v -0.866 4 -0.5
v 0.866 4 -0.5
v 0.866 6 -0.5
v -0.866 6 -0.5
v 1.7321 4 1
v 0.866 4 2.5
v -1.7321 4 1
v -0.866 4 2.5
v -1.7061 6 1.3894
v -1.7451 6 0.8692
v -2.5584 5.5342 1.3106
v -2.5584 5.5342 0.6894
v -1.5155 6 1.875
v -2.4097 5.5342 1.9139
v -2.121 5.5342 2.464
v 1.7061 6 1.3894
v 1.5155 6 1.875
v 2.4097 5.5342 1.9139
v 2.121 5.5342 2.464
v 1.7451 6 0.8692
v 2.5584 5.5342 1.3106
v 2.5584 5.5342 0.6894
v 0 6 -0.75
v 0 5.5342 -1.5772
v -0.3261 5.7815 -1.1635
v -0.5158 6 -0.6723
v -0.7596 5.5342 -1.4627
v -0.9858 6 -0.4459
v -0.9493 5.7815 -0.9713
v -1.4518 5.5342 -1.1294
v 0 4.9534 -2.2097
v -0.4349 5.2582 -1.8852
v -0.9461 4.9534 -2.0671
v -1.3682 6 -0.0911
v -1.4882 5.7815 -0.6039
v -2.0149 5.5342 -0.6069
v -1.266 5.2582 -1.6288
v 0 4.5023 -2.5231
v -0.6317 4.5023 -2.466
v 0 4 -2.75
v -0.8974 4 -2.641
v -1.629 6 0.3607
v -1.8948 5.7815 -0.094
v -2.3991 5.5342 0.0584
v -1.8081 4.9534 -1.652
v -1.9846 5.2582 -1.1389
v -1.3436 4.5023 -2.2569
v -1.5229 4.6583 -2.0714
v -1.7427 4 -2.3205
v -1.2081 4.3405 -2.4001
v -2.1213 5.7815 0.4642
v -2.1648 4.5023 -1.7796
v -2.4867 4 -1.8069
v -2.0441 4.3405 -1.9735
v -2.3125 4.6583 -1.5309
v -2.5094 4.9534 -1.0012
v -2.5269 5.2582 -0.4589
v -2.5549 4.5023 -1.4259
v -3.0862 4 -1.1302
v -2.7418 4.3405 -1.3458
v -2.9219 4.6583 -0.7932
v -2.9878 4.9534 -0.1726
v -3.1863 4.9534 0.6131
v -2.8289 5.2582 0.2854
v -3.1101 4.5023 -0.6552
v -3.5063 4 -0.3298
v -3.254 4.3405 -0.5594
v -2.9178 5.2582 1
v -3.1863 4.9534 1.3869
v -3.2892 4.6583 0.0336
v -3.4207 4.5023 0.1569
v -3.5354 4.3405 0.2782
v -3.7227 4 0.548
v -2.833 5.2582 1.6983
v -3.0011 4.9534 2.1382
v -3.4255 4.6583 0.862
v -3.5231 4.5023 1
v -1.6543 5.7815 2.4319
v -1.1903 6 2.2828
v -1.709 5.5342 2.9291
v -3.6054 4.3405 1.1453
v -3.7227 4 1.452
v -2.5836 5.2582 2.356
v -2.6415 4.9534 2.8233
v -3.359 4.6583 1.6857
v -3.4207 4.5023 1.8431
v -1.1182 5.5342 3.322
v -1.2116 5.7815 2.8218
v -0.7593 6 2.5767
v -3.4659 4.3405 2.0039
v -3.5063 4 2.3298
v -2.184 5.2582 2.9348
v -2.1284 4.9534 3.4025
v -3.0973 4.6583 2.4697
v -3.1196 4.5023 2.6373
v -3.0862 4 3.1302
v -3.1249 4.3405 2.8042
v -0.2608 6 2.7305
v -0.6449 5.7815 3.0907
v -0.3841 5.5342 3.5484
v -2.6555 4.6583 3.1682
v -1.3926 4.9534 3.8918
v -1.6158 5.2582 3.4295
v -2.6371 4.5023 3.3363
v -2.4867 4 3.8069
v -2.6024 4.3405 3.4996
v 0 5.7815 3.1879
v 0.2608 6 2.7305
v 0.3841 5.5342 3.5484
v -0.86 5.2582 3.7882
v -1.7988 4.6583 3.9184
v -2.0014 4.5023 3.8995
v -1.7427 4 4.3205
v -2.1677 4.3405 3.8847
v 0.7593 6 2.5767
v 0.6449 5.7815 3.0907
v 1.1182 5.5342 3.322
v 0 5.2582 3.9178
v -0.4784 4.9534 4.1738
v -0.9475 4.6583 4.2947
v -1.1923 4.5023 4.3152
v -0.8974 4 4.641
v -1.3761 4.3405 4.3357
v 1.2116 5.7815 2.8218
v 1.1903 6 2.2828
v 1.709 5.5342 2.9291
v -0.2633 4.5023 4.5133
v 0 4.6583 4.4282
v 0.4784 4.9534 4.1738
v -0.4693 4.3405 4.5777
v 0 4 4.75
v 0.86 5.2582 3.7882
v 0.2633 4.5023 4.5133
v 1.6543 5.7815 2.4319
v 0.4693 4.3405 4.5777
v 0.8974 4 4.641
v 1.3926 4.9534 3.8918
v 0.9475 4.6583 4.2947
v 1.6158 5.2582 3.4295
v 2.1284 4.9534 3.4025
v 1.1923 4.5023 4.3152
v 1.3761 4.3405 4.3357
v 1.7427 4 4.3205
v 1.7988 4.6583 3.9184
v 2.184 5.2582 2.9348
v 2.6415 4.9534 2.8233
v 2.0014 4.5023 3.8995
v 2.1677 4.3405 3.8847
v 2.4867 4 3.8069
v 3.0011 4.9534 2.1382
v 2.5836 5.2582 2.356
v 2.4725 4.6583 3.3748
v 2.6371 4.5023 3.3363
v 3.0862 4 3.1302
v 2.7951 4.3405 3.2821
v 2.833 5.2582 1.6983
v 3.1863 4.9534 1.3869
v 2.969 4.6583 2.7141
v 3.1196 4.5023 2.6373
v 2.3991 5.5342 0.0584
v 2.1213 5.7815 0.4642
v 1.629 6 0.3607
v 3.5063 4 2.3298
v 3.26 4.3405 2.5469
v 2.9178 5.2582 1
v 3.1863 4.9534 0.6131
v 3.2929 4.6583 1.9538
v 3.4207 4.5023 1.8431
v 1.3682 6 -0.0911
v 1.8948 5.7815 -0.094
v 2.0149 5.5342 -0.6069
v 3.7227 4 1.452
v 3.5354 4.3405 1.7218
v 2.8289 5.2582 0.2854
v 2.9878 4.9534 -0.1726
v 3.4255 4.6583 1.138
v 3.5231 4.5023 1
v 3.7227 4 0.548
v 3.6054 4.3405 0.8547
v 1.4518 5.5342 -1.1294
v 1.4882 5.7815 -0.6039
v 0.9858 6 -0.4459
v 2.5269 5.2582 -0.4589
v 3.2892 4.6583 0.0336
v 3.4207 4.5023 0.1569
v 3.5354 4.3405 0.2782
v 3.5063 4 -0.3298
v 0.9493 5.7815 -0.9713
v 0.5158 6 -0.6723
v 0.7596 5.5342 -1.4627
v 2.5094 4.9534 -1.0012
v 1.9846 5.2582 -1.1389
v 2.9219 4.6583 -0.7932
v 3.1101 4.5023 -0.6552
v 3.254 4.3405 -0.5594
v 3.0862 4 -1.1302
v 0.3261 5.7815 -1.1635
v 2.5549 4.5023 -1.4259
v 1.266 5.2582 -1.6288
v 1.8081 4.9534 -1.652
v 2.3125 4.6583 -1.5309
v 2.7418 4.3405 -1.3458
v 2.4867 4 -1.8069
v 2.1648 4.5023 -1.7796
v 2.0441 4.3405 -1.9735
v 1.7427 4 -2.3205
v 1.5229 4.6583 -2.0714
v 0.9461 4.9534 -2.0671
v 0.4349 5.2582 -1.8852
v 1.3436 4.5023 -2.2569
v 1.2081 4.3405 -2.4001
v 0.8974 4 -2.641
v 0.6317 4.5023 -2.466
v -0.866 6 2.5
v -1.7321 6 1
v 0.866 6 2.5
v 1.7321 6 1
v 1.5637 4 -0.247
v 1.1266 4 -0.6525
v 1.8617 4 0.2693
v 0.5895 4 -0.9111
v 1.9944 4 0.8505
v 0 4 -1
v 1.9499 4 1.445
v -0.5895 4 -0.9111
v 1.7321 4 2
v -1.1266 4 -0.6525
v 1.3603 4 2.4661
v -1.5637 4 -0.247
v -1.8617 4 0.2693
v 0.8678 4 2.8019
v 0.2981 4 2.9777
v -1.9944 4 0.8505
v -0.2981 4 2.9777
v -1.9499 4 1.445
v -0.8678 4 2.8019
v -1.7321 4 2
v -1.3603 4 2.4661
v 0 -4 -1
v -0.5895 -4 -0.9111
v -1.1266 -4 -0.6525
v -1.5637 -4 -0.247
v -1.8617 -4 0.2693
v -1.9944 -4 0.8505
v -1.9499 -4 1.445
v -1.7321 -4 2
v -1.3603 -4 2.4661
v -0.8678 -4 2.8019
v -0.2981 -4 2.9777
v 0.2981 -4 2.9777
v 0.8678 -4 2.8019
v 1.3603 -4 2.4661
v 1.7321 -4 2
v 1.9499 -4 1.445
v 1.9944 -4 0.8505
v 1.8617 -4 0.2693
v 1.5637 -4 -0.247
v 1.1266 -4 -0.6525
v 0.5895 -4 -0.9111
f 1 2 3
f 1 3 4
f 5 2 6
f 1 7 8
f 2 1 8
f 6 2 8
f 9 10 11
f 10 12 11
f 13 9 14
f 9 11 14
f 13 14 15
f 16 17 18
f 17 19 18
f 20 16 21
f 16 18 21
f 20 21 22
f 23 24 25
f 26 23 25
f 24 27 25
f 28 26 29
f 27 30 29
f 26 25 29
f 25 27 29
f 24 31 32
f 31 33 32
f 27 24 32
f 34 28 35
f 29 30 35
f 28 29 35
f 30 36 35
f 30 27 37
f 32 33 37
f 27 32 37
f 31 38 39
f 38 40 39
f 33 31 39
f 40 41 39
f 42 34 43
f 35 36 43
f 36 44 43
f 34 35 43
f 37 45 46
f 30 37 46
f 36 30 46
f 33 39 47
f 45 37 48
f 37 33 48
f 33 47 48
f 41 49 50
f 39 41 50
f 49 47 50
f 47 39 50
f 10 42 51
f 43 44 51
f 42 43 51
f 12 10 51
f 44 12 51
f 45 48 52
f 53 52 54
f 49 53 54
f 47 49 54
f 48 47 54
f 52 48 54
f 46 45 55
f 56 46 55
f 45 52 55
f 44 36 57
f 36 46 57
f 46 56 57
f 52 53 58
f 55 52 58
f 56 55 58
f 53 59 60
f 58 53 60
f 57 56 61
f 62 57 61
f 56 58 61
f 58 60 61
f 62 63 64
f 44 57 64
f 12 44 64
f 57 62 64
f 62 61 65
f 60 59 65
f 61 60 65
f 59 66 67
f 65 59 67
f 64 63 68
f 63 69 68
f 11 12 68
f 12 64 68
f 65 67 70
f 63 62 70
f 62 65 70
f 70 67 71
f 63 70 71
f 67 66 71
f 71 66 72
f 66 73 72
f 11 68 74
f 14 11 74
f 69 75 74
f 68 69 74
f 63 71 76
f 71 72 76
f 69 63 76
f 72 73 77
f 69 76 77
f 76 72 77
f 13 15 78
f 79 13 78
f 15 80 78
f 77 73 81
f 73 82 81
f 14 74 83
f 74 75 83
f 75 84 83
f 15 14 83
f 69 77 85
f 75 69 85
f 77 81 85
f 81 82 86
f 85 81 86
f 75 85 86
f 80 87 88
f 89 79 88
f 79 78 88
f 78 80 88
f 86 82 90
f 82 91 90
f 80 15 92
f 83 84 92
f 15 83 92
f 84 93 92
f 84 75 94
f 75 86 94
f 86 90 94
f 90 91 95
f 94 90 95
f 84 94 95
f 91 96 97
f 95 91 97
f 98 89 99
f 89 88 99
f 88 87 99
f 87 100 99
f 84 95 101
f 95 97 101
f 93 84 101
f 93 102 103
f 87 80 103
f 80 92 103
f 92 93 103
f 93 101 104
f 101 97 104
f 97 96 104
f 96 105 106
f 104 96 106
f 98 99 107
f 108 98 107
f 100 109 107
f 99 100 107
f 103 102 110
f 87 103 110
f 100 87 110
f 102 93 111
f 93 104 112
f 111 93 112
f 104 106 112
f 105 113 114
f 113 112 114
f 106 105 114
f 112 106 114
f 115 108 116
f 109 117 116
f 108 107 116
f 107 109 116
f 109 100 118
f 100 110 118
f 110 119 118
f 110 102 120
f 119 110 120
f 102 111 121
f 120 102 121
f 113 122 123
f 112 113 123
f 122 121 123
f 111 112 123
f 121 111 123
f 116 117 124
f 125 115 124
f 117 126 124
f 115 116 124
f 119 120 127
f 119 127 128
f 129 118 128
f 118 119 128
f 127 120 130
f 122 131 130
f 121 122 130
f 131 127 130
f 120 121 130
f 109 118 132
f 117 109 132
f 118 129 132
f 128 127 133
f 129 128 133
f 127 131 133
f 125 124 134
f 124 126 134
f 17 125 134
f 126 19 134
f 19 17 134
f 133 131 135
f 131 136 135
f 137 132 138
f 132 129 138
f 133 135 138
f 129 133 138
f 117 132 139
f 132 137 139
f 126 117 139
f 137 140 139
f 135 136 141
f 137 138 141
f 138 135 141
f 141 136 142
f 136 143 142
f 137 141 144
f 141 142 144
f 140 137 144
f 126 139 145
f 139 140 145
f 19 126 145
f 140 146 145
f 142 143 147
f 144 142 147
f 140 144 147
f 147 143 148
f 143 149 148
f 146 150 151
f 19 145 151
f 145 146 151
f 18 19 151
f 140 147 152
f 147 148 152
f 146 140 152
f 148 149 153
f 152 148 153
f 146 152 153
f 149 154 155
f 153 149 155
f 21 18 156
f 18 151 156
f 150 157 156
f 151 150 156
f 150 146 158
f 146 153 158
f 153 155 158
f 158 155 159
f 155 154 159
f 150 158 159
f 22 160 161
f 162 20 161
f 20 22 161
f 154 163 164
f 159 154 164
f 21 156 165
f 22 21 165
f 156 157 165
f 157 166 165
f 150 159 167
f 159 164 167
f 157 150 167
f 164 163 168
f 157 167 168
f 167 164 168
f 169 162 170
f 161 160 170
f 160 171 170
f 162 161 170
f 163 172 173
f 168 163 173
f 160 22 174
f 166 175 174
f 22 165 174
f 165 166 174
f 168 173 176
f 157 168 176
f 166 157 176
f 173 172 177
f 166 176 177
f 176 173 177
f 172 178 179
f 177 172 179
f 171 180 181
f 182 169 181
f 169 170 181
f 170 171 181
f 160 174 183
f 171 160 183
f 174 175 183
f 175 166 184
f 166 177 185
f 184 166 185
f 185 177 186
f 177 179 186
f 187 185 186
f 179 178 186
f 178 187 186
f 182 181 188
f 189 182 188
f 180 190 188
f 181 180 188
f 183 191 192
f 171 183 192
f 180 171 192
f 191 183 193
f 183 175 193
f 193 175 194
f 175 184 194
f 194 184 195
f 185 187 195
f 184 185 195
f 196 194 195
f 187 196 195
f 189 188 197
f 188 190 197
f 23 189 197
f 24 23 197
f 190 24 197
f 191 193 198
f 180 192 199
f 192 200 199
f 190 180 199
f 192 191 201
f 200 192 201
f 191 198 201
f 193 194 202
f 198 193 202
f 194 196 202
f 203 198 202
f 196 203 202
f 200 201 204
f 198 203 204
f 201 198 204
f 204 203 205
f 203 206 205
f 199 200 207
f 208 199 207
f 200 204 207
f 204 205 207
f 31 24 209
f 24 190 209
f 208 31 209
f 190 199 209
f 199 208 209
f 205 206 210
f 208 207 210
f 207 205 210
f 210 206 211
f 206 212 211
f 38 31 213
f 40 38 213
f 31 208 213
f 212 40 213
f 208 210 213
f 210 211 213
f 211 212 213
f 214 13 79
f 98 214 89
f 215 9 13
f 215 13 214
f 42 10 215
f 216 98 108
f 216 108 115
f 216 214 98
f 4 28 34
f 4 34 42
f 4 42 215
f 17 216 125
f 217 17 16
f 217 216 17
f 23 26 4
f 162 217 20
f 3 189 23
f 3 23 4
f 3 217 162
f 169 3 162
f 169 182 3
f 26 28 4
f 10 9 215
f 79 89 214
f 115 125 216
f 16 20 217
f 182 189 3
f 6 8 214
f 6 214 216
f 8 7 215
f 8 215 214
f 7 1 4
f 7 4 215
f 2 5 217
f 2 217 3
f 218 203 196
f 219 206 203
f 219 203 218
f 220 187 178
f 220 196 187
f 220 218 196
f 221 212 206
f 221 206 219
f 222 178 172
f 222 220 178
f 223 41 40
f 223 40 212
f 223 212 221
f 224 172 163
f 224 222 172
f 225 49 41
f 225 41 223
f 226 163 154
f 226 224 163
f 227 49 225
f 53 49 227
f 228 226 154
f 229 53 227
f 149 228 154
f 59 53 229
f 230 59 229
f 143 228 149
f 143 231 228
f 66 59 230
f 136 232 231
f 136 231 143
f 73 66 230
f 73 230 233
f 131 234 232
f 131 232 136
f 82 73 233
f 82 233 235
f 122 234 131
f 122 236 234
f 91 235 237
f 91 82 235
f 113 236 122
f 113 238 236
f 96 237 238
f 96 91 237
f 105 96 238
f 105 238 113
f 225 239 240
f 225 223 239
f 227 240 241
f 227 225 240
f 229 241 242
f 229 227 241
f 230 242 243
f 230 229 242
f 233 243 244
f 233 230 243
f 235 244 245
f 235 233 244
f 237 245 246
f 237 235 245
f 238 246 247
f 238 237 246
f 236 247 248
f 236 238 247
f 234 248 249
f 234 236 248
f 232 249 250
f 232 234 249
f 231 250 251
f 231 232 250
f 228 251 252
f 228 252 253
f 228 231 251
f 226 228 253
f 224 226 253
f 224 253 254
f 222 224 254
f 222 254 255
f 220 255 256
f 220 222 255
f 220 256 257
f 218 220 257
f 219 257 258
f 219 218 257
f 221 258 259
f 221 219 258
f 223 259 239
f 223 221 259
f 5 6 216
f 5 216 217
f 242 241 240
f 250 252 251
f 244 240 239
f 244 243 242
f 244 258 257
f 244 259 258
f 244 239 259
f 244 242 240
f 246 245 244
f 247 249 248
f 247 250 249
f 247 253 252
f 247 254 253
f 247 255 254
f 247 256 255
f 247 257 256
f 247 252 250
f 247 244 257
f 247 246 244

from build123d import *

# Parameters (mm, degrees)
SKETCH15_W           = 2
SKETCH15_H           = 8
SKETCH19_R           = 1.75
BOSS_EXTRUDE11_DEPTH = 2


with BuildPart() as part:
    # Sketch15 → Revolve3 (revolve)
    with BuildSketch(Plane(origin=(0, 0, 0), x_dir=(0, 0, -1), z_dir=(1, 0, 0))):
        Rectangle(SKETCH15_W, SKETCH15_H)
        with BuildLine():
            Line((0.75, 6), (0.75, 4))
            Line((0.75, 4), (1, 4))
            Line((1, 4), (2.75, 4))
            add(Edge.make_bspline(
                [(0.75, 6), (2.290975881, 5.319572534), (2.75, 4)],
                knots=[0, 0, 0, 0.856055689, 0.856055689, 0.856055689], degree=2))
        make_face()
    revolve(axis=Axis((0, -4, 1), (0, 1, 0)))

    # Sketch19 → Boss-Extrude11 (add)
    with BuildSketch(Plane(origin=(0, 4, 0), x_dir=(1, 0, 0), z_dir=(0, 1, 0))):
        with Locations((0, -1)):
            Circle(SKETCH19_R)
        Polygon((1.732050808, -1), (0.866025404, 0.5), (-0.866025404, 0.5), (-1.732050808, -1), (-0.866025404, -2.5), (0.866025404, -2.5), align=None, mode=Mode.SUBTRACT)
    extrude(amount=BOSS_EXTRUDE11_DEPTH)


solid = part.part
